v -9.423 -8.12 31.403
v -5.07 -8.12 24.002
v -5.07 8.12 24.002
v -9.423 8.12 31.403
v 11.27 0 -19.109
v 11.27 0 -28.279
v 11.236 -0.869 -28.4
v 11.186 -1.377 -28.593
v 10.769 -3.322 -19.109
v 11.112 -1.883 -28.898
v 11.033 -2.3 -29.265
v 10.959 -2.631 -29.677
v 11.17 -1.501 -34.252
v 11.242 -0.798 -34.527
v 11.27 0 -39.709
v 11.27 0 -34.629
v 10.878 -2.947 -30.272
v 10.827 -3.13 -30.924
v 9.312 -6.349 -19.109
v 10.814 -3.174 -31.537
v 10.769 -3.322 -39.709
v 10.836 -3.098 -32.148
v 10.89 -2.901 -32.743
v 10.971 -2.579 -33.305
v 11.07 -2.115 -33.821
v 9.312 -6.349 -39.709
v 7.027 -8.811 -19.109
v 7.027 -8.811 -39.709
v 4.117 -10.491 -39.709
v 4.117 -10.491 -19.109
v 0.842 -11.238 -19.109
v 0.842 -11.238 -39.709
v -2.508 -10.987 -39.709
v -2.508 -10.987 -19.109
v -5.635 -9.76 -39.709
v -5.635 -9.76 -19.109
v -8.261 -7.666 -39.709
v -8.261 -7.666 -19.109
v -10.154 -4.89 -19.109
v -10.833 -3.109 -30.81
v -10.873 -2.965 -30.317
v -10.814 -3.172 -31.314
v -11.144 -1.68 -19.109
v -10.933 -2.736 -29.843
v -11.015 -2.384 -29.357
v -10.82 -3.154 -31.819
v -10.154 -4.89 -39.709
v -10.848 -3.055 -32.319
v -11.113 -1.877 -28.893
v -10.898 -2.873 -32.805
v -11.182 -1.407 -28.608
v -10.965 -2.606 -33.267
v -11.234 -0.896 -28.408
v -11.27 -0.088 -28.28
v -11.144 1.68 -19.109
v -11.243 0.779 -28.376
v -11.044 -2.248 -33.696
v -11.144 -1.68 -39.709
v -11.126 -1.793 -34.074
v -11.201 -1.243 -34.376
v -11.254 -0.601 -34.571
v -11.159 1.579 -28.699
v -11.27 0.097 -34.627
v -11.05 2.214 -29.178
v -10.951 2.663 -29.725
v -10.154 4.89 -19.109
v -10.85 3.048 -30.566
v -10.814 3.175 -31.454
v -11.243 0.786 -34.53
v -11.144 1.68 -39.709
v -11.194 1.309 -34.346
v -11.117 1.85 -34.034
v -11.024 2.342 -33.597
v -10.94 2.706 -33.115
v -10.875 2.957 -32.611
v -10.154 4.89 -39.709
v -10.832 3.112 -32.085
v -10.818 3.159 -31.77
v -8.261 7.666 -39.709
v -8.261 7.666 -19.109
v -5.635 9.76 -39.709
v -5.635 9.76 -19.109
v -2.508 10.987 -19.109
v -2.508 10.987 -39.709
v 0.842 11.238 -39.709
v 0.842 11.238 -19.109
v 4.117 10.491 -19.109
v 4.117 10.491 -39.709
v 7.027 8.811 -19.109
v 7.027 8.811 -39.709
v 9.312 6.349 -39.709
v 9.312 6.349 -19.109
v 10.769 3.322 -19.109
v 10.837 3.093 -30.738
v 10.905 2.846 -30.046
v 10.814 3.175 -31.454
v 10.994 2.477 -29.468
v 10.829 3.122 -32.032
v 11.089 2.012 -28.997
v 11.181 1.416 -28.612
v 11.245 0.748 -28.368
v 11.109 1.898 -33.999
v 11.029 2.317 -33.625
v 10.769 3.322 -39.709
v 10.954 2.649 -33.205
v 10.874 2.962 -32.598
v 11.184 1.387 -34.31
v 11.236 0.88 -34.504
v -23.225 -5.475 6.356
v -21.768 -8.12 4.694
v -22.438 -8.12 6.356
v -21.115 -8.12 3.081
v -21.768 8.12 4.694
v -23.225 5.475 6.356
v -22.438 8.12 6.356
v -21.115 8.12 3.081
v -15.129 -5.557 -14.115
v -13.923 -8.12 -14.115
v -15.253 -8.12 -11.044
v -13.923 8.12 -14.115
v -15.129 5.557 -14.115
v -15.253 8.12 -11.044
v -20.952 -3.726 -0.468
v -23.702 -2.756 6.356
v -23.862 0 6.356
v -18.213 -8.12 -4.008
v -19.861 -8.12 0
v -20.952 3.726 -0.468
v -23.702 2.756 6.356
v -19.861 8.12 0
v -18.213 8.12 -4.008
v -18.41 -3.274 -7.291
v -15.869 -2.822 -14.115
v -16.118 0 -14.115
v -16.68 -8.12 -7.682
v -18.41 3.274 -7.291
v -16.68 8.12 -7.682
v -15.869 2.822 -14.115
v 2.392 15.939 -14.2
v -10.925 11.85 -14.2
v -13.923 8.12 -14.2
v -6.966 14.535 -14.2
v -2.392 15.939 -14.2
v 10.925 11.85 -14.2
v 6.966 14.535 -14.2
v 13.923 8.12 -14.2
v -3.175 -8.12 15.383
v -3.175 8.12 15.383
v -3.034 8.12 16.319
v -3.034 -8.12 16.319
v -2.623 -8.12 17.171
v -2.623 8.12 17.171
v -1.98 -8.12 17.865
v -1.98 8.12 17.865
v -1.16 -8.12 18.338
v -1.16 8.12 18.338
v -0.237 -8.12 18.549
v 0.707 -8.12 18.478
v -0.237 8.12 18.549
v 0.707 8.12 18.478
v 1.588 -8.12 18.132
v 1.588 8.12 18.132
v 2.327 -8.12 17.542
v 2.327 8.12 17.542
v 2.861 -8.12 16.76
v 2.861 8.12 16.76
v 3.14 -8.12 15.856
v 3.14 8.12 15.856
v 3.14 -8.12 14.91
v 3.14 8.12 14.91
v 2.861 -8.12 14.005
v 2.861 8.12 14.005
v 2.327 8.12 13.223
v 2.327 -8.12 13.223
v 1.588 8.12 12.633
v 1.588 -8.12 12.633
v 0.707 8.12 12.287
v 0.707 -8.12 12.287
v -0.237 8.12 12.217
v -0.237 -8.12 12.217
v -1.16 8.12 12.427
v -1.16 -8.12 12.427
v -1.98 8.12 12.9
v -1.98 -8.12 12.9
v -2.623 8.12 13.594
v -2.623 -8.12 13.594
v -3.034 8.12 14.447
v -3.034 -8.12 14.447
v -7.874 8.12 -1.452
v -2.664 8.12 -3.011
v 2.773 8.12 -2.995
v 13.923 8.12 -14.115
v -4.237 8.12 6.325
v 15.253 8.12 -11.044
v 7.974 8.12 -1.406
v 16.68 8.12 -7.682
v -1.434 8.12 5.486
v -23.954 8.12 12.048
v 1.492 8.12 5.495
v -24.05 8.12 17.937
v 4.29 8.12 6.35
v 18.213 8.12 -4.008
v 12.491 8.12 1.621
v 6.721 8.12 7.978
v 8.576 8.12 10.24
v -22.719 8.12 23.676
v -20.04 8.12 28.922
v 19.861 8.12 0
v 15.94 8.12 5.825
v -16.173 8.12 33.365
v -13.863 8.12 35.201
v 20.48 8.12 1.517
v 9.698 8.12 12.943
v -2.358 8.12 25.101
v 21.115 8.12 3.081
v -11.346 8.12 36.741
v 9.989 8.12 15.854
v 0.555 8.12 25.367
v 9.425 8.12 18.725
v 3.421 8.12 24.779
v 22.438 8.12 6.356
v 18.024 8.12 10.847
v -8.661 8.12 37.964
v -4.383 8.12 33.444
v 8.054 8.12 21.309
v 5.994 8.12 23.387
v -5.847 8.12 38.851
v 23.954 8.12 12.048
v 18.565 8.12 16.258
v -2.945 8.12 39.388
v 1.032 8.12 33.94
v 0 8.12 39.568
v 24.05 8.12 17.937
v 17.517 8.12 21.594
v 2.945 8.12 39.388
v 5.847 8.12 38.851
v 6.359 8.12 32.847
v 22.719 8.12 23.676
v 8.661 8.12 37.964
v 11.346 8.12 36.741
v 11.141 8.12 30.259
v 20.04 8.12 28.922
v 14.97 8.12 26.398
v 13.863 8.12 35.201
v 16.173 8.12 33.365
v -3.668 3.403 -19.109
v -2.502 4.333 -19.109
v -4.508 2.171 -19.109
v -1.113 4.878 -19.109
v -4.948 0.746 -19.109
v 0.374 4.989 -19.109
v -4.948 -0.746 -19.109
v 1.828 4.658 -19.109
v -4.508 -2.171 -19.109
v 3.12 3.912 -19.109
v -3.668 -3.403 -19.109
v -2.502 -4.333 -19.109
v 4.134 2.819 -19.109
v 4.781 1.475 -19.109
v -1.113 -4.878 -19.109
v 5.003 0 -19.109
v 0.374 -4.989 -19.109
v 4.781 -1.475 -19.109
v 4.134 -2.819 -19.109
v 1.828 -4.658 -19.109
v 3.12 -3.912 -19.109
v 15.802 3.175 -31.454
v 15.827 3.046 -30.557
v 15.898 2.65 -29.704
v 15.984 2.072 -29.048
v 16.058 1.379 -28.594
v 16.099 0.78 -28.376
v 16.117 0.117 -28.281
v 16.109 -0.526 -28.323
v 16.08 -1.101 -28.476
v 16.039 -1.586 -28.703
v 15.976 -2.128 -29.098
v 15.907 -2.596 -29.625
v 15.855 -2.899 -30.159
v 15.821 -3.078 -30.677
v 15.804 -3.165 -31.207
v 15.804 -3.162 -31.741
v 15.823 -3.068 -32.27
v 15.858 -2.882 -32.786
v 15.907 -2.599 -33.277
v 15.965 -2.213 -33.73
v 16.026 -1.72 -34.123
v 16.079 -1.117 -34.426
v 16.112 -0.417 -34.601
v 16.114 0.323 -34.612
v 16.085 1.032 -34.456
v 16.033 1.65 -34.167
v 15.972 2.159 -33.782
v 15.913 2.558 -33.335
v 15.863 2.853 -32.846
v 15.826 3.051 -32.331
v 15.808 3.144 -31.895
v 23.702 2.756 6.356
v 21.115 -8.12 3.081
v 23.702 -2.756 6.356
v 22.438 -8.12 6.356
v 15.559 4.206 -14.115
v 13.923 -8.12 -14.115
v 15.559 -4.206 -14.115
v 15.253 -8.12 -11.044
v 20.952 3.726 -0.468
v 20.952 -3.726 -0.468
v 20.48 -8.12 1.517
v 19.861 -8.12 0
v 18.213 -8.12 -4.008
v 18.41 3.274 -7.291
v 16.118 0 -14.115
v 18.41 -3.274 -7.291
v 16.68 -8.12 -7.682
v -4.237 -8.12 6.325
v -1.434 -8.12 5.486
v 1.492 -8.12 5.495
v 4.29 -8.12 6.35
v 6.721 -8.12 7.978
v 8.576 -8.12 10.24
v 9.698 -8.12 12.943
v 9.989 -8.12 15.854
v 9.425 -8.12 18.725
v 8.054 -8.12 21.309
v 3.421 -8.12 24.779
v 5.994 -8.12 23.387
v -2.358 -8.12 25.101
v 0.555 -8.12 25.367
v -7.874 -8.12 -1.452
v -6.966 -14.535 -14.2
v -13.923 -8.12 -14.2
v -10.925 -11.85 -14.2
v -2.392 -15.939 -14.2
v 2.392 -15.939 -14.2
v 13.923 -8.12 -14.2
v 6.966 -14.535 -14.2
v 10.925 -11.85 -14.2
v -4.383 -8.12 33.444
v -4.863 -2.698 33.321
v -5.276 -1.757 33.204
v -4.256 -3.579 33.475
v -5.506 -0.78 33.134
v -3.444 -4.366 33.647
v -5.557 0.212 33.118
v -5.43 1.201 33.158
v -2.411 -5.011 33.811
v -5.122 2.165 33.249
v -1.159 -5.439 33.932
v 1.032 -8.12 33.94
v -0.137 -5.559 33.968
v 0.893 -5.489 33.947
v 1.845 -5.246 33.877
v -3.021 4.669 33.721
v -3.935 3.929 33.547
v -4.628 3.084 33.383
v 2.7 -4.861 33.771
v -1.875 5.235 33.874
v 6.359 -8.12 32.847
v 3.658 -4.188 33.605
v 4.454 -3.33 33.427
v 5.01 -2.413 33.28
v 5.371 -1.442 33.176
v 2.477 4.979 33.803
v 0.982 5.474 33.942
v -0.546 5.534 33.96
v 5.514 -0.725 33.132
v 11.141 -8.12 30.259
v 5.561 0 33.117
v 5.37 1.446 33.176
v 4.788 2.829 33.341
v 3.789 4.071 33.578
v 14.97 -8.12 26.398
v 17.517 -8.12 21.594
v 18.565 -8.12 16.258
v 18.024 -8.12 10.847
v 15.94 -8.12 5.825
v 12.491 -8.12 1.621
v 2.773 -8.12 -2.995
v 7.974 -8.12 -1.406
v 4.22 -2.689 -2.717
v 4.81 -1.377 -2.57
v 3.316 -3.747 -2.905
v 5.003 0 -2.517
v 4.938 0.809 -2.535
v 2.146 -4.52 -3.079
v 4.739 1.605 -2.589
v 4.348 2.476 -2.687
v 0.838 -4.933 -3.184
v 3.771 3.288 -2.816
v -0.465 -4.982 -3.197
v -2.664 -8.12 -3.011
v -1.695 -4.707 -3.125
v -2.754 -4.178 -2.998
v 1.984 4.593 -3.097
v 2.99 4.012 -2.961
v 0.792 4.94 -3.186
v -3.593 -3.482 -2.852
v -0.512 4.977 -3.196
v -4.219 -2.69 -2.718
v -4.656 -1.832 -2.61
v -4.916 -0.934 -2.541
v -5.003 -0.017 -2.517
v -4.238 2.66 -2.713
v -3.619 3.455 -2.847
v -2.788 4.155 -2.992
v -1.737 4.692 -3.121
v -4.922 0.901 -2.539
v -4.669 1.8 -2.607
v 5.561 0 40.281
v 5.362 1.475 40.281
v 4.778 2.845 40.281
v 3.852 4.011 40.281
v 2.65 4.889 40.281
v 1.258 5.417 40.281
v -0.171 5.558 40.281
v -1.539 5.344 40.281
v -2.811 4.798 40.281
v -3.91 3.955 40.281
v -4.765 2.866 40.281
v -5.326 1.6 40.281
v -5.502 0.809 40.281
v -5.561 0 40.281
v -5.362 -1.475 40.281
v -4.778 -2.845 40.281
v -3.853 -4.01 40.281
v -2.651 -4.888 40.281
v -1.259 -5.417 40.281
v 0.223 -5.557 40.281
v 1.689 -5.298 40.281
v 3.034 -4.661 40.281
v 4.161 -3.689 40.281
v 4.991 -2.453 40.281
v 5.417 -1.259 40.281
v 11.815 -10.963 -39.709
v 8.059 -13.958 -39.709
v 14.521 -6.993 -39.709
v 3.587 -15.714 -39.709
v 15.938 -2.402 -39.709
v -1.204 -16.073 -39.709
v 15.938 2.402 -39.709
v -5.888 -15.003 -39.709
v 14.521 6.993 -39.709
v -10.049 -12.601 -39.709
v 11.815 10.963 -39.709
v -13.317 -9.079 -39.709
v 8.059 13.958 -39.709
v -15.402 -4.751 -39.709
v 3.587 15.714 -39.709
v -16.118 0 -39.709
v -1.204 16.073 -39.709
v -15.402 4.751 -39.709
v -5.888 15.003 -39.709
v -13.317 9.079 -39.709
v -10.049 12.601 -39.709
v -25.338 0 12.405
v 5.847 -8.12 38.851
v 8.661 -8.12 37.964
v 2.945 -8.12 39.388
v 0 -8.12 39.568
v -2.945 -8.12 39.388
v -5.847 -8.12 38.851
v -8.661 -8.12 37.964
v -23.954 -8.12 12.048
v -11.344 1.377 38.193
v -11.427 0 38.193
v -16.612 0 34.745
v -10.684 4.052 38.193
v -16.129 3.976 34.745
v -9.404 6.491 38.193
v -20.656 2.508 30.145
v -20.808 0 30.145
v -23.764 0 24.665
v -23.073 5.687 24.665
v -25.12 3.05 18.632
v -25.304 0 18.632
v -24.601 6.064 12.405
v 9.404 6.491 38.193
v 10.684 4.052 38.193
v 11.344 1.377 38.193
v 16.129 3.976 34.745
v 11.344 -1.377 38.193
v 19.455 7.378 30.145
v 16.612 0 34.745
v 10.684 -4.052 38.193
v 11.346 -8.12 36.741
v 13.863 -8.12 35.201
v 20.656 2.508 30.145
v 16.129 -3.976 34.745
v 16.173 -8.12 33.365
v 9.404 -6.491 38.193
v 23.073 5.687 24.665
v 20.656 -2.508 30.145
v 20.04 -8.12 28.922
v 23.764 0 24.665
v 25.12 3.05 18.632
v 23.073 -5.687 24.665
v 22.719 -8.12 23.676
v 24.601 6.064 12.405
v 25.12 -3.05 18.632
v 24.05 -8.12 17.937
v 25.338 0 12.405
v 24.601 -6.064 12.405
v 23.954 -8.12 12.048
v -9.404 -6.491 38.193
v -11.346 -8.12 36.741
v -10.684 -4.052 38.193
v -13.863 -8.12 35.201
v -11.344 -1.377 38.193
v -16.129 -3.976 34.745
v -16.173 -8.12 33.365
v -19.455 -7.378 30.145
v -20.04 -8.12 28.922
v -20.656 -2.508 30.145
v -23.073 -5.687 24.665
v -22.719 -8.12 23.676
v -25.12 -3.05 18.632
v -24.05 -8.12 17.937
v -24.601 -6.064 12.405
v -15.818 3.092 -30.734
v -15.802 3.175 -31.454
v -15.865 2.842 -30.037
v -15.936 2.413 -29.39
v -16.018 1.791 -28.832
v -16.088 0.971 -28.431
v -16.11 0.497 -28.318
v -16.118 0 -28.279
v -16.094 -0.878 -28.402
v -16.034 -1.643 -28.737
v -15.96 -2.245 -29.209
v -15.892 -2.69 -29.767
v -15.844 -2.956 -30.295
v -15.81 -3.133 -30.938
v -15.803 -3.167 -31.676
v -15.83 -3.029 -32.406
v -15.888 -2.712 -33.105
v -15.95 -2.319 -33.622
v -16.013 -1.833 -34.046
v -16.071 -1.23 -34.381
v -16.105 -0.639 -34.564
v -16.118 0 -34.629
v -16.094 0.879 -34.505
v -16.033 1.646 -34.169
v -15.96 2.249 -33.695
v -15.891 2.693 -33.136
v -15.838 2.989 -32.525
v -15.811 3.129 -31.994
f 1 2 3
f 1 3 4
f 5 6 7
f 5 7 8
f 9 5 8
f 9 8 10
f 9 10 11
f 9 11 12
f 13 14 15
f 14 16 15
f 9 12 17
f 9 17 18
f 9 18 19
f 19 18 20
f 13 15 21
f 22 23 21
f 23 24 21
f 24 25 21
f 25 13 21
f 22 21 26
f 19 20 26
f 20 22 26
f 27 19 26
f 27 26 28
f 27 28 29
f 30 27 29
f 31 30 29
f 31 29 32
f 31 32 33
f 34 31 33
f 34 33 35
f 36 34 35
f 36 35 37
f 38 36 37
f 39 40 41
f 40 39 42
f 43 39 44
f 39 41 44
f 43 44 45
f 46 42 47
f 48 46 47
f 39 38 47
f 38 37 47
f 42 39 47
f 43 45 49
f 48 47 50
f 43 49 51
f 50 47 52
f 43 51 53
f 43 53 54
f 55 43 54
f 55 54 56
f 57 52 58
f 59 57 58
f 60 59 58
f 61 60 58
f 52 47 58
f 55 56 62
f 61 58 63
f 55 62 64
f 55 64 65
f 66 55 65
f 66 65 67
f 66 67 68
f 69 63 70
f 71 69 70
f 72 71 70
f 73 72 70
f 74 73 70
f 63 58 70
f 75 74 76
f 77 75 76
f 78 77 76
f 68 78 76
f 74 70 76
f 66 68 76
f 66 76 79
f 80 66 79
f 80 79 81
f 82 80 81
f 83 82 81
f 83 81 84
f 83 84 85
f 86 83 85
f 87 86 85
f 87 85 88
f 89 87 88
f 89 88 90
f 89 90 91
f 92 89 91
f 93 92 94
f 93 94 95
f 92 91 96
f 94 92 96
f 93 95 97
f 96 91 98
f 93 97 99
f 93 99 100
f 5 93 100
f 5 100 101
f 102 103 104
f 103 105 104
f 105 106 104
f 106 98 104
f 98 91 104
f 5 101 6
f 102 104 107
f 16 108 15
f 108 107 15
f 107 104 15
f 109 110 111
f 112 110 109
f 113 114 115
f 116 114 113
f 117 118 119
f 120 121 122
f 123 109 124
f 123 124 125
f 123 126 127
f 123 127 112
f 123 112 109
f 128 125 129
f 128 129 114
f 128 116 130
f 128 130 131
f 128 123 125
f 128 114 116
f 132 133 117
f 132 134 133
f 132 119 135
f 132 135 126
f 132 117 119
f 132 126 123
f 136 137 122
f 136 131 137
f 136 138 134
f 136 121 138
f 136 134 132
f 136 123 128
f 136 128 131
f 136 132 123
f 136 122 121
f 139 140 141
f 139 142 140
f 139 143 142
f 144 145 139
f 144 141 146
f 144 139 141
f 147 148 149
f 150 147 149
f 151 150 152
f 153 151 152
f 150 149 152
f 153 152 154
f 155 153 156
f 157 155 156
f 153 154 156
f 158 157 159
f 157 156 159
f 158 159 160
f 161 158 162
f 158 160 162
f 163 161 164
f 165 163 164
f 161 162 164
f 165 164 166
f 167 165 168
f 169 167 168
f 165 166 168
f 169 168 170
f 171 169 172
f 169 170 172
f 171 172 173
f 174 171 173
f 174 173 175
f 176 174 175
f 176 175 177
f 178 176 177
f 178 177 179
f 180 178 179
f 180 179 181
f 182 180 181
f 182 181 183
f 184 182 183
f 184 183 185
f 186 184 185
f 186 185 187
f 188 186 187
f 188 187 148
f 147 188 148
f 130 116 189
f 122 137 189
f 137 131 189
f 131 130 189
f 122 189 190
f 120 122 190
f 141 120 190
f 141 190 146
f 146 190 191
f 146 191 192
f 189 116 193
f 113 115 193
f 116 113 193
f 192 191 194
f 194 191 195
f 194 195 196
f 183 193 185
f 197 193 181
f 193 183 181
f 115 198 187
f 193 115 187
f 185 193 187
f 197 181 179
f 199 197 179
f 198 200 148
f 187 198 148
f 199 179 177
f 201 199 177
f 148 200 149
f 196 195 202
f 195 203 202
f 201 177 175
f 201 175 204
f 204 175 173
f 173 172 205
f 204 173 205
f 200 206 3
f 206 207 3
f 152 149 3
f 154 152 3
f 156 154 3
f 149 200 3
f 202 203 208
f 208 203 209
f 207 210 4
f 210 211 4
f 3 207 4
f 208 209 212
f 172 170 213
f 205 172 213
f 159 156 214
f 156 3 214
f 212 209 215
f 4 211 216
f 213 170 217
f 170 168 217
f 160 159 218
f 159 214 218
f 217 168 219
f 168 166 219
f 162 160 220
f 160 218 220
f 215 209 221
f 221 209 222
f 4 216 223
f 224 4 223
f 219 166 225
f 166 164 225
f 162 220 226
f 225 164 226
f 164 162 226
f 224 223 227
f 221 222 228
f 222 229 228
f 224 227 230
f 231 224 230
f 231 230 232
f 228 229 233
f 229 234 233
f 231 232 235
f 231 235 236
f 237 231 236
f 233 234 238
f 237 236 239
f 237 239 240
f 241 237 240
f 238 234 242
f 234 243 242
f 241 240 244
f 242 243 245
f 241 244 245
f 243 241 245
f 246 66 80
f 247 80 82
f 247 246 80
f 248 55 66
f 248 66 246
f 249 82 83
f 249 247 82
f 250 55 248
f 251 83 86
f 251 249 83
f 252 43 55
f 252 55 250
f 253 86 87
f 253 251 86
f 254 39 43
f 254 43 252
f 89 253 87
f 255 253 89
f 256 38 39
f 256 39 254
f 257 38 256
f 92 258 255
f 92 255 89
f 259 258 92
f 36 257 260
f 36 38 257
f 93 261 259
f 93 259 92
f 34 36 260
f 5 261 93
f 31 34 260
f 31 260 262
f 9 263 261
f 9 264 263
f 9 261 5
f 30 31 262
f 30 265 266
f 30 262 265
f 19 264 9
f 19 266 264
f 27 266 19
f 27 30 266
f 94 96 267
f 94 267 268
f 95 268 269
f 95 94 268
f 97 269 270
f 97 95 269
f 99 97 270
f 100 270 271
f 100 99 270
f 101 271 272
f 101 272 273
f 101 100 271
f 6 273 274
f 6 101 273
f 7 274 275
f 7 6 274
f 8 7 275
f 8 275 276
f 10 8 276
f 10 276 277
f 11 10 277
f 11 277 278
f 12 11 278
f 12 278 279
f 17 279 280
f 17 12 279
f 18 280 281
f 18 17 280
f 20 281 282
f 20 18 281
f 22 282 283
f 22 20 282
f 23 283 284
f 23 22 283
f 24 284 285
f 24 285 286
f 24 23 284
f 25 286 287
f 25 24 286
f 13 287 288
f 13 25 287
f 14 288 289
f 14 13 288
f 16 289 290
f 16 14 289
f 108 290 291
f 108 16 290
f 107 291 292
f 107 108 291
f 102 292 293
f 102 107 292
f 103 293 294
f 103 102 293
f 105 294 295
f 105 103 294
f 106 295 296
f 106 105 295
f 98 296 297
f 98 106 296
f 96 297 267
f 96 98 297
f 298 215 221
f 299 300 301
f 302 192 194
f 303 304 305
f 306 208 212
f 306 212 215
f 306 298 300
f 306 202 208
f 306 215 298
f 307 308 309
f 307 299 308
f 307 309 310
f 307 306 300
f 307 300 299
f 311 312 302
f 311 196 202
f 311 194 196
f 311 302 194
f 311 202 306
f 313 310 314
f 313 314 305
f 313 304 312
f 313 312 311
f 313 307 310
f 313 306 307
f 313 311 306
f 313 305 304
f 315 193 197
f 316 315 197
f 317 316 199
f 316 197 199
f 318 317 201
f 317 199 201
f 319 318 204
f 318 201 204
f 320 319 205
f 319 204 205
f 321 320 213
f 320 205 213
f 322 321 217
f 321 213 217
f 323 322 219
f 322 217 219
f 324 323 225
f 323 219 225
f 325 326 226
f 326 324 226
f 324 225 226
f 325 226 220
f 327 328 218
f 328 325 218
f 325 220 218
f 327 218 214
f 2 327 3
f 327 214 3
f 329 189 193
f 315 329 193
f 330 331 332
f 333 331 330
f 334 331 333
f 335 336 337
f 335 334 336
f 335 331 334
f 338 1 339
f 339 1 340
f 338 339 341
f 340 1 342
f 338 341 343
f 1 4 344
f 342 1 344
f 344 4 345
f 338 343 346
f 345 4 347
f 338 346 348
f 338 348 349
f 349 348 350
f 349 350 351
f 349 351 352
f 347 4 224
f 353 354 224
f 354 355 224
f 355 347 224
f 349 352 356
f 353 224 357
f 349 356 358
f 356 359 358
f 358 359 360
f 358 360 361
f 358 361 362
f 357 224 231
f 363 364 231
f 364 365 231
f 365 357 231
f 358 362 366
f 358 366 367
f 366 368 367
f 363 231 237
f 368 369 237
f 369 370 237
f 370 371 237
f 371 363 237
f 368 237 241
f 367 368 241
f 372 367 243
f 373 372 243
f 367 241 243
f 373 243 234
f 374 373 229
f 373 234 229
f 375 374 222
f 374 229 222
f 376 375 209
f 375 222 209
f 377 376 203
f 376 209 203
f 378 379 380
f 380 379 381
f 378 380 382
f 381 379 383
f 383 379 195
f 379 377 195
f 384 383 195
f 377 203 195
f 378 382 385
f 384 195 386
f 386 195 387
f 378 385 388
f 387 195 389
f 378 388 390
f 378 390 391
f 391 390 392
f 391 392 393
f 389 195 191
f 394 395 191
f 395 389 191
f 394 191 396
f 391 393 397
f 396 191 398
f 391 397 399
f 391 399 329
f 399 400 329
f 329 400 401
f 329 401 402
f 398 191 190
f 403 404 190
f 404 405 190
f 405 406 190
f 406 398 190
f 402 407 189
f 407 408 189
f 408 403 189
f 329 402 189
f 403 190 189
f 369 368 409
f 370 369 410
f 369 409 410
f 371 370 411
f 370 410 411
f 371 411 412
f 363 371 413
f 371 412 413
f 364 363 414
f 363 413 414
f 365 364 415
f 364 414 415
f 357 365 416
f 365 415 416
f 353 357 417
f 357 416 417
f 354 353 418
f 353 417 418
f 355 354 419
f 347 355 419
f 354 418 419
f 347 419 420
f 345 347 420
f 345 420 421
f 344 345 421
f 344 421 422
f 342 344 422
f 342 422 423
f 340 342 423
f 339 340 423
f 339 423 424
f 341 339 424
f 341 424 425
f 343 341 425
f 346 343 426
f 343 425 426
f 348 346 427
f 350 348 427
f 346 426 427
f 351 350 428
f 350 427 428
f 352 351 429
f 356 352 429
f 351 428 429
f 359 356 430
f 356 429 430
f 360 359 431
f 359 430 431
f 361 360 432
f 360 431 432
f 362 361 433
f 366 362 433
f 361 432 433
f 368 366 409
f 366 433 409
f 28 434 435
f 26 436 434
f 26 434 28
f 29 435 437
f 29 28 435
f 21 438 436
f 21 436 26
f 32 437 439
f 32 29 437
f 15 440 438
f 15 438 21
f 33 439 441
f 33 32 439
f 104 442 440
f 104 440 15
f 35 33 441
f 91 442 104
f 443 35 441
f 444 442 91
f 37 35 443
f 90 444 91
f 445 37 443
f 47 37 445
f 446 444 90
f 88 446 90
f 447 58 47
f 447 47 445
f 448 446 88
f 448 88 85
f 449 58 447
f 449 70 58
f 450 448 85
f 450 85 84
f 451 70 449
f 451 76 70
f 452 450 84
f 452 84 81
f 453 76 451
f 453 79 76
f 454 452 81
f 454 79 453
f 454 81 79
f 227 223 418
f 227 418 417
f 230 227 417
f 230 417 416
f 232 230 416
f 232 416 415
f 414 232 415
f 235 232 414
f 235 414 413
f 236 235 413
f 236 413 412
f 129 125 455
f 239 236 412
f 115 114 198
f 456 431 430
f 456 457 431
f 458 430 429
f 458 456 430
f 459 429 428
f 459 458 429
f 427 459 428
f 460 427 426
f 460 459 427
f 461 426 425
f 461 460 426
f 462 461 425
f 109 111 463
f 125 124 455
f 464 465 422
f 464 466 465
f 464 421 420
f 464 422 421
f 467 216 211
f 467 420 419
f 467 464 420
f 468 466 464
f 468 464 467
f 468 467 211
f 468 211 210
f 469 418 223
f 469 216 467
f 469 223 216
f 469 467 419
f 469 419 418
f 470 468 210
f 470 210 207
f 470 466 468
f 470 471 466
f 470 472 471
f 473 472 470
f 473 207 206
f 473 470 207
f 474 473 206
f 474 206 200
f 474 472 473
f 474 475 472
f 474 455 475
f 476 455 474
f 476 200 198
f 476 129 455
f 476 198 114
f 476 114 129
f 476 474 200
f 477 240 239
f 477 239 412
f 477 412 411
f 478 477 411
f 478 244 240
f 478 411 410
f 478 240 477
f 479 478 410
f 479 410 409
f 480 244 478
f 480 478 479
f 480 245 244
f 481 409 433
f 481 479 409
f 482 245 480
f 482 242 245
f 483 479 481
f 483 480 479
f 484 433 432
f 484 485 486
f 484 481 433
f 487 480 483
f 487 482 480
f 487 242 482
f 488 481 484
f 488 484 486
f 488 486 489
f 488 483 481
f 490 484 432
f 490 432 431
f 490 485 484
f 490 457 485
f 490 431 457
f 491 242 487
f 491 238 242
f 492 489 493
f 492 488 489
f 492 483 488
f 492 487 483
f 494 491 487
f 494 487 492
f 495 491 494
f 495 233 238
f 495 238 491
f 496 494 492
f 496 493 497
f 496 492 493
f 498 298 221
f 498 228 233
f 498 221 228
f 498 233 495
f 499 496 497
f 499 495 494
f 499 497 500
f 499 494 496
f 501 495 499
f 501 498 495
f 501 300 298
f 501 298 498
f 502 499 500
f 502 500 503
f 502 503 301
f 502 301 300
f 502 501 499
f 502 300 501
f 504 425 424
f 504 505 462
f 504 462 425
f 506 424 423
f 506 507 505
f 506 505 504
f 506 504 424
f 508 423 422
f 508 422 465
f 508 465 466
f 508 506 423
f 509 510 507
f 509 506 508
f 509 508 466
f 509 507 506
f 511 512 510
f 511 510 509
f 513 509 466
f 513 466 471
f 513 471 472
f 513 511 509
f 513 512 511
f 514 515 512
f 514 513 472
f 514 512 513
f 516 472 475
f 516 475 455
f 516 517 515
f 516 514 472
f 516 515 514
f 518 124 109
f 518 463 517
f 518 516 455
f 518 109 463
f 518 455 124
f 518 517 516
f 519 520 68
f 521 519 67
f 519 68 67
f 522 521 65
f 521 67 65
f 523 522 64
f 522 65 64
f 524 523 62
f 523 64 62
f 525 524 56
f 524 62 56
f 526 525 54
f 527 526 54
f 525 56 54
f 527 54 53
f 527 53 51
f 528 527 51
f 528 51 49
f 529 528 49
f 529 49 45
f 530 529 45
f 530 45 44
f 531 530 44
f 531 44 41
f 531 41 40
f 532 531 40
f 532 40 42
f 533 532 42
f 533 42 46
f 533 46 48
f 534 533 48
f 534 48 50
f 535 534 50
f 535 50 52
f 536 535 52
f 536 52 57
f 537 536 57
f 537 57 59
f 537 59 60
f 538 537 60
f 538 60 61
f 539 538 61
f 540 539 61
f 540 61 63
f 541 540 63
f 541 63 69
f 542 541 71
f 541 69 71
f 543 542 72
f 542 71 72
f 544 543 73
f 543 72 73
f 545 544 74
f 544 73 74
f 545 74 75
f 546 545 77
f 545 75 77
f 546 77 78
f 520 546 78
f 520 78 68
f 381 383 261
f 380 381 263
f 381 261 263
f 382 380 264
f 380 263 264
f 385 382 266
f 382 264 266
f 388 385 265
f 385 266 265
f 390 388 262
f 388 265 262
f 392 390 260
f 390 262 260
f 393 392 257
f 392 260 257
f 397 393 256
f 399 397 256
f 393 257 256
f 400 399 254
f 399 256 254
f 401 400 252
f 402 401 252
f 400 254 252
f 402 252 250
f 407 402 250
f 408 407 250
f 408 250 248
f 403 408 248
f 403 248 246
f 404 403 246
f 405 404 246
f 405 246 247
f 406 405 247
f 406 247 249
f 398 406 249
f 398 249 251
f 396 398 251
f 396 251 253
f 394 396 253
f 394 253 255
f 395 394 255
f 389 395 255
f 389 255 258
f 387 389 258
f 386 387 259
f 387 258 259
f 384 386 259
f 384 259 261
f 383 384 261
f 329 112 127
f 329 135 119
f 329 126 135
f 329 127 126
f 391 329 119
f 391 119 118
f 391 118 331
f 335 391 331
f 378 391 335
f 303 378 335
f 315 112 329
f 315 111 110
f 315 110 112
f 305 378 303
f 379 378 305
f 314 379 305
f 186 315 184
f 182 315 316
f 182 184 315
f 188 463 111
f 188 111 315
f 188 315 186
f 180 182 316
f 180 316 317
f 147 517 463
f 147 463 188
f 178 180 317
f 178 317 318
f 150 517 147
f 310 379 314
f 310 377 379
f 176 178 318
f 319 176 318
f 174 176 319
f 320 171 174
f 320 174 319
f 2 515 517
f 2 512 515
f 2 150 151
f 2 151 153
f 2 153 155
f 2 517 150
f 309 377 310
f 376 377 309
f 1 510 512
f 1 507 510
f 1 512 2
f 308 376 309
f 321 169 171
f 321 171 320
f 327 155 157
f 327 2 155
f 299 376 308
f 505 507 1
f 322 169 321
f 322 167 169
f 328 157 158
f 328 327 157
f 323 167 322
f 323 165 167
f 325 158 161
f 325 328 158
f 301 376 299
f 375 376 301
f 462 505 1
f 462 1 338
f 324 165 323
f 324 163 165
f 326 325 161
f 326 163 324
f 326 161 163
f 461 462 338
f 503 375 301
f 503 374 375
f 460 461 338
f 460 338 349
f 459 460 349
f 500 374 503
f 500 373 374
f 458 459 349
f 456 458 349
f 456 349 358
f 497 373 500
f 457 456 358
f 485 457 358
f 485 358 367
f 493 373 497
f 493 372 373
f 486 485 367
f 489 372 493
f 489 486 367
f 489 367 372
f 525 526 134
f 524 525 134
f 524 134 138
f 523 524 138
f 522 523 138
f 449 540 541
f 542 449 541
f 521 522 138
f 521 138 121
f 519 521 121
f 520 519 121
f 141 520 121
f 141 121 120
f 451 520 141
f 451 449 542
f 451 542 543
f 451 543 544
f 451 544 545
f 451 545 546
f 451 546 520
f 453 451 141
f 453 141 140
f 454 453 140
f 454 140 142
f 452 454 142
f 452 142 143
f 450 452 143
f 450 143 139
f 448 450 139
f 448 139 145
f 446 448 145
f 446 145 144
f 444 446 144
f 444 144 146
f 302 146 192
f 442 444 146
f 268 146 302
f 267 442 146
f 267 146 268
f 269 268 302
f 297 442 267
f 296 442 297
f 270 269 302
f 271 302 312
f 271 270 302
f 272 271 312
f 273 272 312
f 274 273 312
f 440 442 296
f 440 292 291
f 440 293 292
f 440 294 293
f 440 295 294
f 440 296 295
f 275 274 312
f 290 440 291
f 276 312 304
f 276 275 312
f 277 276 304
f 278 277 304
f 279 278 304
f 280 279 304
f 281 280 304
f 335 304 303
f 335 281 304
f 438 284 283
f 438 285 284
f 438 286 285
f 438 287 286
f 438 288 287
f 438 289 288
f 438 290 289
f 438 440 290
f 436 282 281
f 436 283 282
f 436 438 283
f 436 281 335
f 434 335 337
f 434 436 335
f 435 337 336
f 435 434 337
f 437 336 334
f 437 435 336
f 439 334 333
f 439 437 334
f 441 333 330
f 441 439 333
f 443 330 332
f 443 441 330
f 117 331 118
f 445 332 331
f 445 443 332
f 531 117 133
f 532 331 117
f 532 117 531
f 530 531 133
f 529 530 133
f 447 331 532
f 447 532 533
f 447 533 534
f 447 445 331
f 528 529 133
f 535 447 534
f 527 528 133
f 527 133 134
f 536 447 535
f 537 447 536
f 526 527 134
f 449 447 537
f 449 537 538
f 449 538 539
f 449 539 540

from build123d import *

# Parameters (mm, degrees)
F2_W           = 143.0530622602
F2_H           = 41.3108188659
F3_DEPTH       = 14.2
F4_DEPTH       = 45
F5_R           = 3.175
F6_DEPTH       = 25
F7_R           = 11.27
F7_R_2         = 5.0034619329
F8_DEPTH       = 20.6
F9_DEPTH       = 38.1921002041
F11_R          = 5.5610063416
F12_DEPTH      = 13
F13_R          = 3.175
F14_DEPTH      = 25.5131088414
F14_DEPTH_BACK = 25


with BuildPart() as f1:
    # F0 (on Front) → F1 (revolve)
    with BuildSketch(Plane.XZ):
        with BuildLine():
            ThreePointArc((-23.8617697281, 6.3559776459), (-20.6996107179, 0.4699326202), (-16.1176094264, -4.3931980396))
            Line((-16.1176094264, -4.3931980396), (-16.1176094264, 11.4784657965))
            Line((-16.1176094264, 11.4784657965), (0, 11.4784657965))
            Line((0, 11.4784657965), (0, 40.8949155528))
            ThreePointArc((0, 40.8949155528), (-20.9900112333, 29.8840868605), (-23.8617697281, 6.3559776459))
        make_face()
        with BuildLine():
            ThreePointArc((-16.1176094264, -4.3931980396), (-8.5539497274, -8.6525348005), (0, -10.12930213))
            Line((0, -10.12930213), (0, 11.4784657965))
            Line((0, 11.4784657965), (-16.1176094264, 11.4784657965))
            Line((-16.1176094264, 11.4784657965), (-16.1176094264, -4.3931980396))
        make_face()
        with BuildLine():
            Line((-16.1176094264, -14.11514998), (-16.1176094264, -39.7087657565))
            Line((-16.1176094264, -39.7087657565), (0, -39.7087657565))
            Line((0, -39.7087657565), (0, -10.12930213))
            ThreePointArc((0, -10.12930213), (-8.5539497274, -8.6525348005), (-16.1176094264, -4.3931980396))
            Line((-16.1176094264, -4.3931980396), (-16.1176094264, -14.11514998))
        make_face()
        with BuildLine():
            Line((-23.8617697281, 6.3559776459), (-16.1176094264, -14.11514998))
            Line((-16.1176094264, -14.11514998), (-16.1176094264, -4.3931980396))
            ThreePointArc((-16.1176094264, -4.3931980396), (-20.6996107179, 0.4699326202), (-23.8617697281, 6.3559776459))
        make_face()
    revolve(axis=Axis((0, 0, 1.6492682043), (0, 0, -1)))

    # F2 (on Top) → F3 (cut)
    with BuildSketch(Plane.XY):
        with Locations((1.9829161465, 28.7757953629)):
            Rectangle(F2_W, F2_H)
        with Locations((1.9829161465, -28.7757953629)):
            Rectangle(F2_W, F2_H)
    extrude(amount=-F3_DEPTH, mode=Mode.SUBTRACT)

    # F2 (on Top) → F4 (cut)
    with BuildSketch(Plane.XY):
        with Locations((1.9829161465, 28.7757953629)):
            Rectangle(F2_W, F2_H)
        with Locations((1.9829161465, -28.7757953629)):
            Rectangle(F2_W, F2_H)
    extrude(amount=F4_DEPTH, mode=Mode.SUBTRACT)

    # F5 (on face) → F6 (cut)
    with BuildSketch(Plane(origin=(0, 8.1203859299, 0), x_dir=(-1, 0, 0), z_dir=(0, 1, 0))):
        with BuildLine():
            ThreePointArc((4.2365711861, 6.3245803627), (-9.9889031453, 15.8537779996), (5.0700626603, 24.0022303941))
            Line((5.0700626603, 24.0022303941), (9.4230322282, 31.4025509617))
            ThreePointArc((9.4230322282, 31.4025509617), (-18.5650084761, 16.2581366481), (7.8739355899, -1.4524800561))
            Line((7.8739355899, -1.4524800561), (4.2365711861, 6.3245803627))
        make_face()
        with Locations((0, 15.3828067114)):
            Circle(F5_R)
    extrude(amount=-F6_DEPTH, mode=Mode.SUBTRACT)

    # F7 (on face) → F8 (cut)
    with BuildSketch(Plane(origin=(0, 0, -39.7087657565), x_dir=(1, 0, 0), z_dir=(0, 0, -1))):
        Circle(F7_R)
        Circle(F7_R_2, mode=Mode.SUBTRACT)
    extrude(amount=-F8_DEPTH, mode=Mode.SUBTRACT)

    # F7 (on face) → F9 (cut, up to face)
    with BuildSketch(Plane(origin=(0, 0, -39.7087657565), x_dir=(1, 0, 0), z_dir=(0, 0, -1))):
        Circle(F7_R_2)
    extrude(amount=-F9_DEPTH, mode=Mode.SUBTRACT)

    # F11 (on offset) → F12 (cut)
    with BuildSketch(Plane.XY.offset(41.8)):
        Circle(F11_R)
    extrude(amount=-F12_DEPTH, mode=Mode.SUBTRACT)

    # F13 (on Right) → F14 (cut, two sides)
    with BuildSketch(Plane.YZ) as f14_sk:
        with Locations((0, -31.4537657565)):
            Circle(F13_R)
    extrude(amount=F14_DEPTH, mode=Mode.SUBTRACT)
    extrude(f14_sk.sketch, amount=-F14_DEPTH_BACK, mode=Mode.SUBTRACT)


solid = f1.part
